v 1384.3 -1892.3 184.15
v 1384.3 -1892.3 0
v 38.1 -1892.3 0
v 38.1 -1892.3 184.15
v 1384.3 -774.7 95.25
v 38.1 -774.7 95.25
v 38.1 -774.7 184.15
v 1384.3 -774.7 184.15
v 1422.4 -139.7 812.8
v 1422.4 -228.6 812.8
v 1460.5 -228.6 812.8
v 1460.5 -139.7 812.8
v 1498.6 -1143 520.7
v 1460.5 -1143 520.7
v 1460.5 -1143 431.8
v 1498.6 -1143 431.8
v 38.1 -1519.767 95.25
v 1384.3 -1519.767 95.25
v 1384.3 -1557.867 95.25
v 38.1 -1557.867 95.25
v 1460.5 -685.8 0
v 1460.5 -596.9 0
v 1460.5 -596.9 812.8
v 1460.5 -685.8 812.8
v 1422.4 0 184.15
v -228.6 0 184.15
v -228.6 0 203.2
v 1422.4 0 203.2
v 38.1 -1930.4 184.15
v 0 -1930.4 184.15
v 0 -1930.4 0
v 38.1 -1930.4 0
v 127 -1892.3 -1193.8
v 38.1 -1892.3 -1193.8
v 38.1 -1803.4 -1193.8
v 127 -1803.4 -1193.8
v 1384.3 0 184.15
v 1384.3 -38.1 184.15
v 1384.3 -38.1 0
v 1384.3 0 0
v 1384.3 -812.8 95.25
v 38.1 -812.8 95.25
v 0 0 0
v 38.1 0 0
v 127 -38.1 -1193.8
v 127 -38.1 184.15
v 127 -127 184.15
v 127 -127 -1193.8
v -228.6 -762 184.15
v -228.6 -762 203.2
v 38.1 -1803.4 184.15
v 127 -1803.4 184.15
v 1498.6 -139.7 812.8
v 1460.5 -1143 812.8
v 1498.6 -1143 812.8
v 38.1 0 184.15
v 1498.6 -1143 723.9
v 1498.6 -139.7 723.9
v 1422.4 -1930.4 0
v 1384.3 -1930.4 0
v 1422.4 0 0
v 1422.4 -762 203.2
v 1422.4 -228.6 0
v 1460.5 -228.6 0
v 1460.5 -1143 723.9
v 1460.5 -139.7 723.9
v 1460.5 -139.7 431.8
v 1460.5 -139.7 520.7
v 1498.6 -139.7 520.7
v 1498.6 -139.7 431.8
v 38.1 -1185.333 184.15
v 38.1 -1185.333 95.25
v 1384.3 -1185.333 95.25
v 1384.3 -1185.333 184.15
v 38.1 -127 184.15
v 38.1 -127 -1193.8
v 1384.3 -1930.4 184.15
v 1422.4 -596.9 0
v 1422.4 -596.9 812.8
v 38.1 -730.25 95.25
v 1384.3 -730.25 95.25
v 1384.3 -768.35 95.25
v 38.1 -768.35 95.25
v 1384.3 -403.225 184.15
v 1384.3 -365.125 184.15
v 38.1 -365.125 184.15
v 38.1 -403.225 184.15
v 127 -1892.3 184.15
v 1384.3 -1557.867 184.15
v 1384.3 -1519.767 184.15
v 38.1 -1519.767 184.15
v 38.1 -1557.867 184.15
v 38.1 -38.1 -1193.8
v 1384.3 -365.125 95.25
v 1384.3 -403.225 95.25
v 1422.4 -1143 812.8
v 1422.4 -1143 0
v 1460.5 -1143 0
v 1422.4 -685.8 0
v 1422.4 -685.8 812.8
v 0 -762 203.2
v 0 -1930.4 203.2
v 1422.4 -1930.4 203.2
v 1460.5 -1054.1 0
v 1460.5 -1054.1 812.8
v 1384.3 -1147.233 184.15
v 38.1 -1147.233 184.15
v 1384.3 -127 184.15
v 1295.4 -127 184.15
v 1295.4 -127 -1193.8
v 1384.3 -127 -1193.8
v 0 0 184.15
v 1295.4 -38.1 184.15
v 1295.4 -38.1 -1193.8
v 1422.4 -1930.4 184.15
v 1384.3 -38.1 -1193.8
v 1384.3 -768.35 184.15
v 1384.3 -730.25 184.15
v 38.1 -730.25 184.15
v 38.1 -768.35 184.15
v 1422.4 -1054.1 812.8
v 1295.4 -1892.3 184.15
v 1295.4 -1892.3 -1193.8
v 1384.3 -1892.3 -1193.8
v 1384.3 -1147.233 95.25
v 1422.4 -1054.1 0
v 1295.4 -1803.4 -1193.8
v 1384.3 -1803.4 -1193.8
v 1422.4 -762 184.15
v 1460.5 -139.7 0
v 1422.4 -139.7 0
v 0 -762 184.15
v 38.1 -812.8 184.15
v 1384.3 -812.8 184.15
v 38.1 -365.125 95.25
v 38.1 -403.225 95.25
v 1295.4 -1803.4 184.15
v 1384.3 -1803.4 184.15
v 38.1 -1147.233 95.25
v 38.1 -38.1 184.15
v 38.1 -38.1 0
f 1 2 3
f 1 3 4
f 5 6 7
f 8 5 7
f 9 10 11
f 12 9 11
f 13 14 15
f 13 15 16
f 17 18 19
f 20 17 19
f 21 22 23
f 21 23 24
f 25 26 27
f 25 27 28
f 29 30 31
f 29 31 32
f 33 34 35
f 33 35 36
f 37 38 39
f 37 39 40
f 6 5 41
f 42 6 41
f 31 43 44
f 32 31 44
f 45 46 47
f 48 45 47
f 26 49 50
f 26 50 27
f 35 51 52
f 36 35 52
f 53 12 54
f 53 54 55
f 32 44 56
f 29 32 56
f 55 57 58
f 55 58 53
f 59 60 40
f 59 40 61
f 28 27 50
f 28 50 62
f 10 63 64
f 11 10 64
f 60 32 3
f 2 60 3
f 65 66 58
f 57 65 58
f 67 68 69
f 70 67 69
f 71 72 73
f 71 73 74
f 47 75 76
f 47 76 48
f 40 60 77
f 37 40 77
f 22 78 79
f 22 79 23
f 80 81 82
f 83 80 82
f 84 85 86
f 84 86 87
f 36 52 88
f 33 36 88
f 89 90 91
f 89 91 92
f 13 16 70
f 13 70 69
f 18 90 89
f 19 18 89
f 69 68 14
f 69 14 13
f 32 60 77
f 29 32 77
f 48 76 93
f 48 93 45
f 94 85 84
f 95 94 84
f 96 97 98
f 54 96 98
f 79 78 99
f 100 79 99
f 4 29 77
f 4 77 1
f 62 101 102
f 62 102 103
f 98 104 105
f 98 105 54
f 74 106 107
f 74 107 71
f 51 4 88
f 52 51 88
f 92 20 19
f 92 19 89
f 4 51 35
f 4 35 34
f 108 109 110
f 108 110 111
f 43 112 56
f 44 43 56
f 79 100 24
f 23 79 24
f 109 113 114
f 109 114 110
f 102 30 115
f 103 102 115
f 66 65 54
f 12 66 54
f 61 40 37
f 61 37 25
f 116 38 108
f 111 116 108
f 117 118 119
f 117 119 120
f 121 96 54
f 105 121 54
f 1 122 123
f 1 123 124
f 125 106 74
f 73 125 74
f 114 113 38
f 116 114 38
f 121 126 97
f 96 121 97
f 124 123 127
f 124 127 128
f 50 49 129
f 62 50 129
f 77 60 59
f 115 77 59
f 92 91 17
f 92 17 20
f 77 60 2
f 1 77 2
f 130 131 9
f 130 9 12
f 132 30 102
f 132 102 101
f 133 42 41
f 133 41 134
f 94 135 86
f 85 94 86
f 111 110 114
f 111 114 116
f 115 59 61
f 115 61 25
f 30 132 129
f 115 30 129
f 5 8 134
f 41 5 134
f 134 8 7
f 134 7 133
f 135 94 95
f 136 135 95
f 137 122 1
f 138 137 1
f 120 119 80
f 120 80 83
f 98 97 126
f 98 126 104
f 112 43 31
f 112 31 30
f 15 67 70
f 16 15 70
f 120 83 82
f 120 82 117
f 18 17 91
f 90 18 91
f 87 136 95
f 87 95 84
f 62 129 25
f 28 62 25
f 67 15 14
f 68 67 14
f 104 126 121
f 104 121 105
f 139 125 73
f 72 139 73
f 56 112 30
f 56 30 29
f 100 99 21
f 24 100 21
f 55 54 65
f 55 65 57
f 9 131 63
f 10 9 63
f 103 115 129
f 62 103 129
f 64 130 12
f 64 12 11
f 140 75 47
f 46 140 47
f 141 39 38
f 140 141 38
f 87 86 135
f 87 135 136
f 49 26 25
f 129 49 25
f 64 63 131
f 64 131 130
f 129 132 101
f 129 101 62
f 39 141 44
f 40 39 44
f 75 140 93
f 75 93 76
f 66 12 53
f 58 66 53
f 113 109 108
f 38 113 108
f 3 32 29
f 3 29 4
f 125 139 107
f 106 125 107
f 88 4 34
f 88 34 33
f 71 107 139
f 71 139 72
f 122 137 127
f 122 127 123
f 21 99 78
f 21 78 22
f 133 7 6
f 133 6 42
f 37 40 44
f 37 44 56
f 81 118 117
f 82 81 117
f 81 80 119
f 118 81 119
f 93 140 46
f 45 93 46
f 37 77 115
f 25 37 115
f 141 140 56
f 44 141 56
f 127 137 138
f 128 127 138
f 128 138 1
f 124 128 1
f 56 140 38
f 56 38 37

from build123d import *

# Parameters (mm, degrees)
F0_W      = 38.1
F0_H      = 184.15
F1_DEPTH  = 1930.4
F2_W      = 38.1
F2_H      = 184.15
F3_DEPTH  = 1346.2
F4_W      = 38.1
F4_H      = 184.15
F5_DEPTH  = 1930.4
F6_W      = 38.1
F6_H      = 184.15
F7_DEPTH  = 1346.2
F8_W      = 38.1
F8_H      = 88.9
F9_DEPTH  = 1346.2
F10_W     = 1651
F10_H     = 762
F11_DEPTH = 19.05
F12_W     = 1422.4
F12_H     = 1168.4
F13_DEPTH = 19.05
F14_W     = 88.9
F14_H     = 88.9
F15_DEPTH = 1377.95
F16_W     = 38.1
F16_H     = 88.9
F17_DEPTH = 812.8
F18_W     = 38.1
F18_H     = 88.9
F19_DEPTH = 1003.3


with BuildPart() as f1:
    # F0 (on Front) → F1 (new body)
    with BuildSketch(Plane.XZ):
        with Locations((19.05, 92.075)):
            Rectangle(F0_W, F0_H)
    extrude(amount=F1_DEPTH)


with BuildPart() as f3:
    # F2 (on face) → F3 (new body)
    with BuildSketch(Plane.YZ.offset(38.1)):
        with Locations((-1911.35, 92.075)):
            Rectangle(F2_W, F2_H)
    extrude(amount=F3_DEPTH)


with BuildPart() as f5:
    # F4 (on face) → F5 (new body, through all)
    with BuildSketch(Plane.XZ.offset(1930.4)):
        with Locations((1403.35, 92.075)):
            Rectangle(F4_W, F4_H)
    extrude(amount=-F5_DEPTH)


with BuildPart() as f7:
    # F6 (on face) → F7 (new body, through all)
    with BuildSketch(Plane.YZ.offset(38.1)):
        with Locations((-19.05, 92.075)):
            Rectangle(F6_W, F6_H)
    extrude(amount=F7_DEPTH)


with BuildPart() as f9:
    # F8 (on face) → F9 (new body, through all)
    with BuildSketch(Plane(origin=(1384.3, 0, 0), x_dir=(0, -1, 0), z_dir=(-1, 0, 0))):
        with Locations((749.3, 139.7)):
            Rectangle(F8_W, F8_H)
        with Locations((793.75, 139.7)):
            Rectangle(F8_W, F8_H)
        with Locations((384.175, 139.7)):
            Rectangle(F8_W, F8_H)
        with Locations((1166.283333, 139.7)):
            Rectangle(F8_W, F8_H)
        with Locations((1538.816667, 139.7)):
            Rectangle(F8_W, F8_H)
    extrude(amount=F9_DEPTH)


with BuildPart() as f11:
    # F10 (on face) → F11 (new body)
    with BuildSketch(Plane.XY.offset(184.15)):
        with Locations((596.9, -381)):
            Rectangle(F10_W, F10_H)
    extrude(amount=F11_DEPTH)


with BuildPart() as f13:
    # F12 (on face) → F13 (new body, through all)
    with BuildSketch(Plane.XY.offset(184.15)):
        with Locations((711.2, -1346.2)):
            Rectangle(F12_W, F12_H)
    extrude(amount=F13_DEPTH)


with BuildPart() as f15:
    # F14 (on face) → F15 (new body)
    with BuildSketch(Plane(origin=(0, 0, 184.15), x_dir=(1, 0, 0), z_dir=(0, 0, -1))):
        with Locations((1339.85, 1847.85)):
            Rectangle(F14_W, F14_H)
        with Locations((82.55, 1847.85)):
            Rectangle(F14_W, F14_H)
        with Locations((82.55, 82.55)):
            Rectangle(F14_W, F14_H)
        with Locations((1339.85, 82.55)):
            Rectangle(F14_W, F14_H)
    extrude(amount=F15_DEPTH)


with BuildPart() as f17:
    # F16 (on face) → F17 (new body)
    with BuildSketch(Plane(origin=(0, 0, 0), x_dir=(1, 0, 0), z_dir=(0, 0, -1))):
        with Locations((1441.45, 1098.55)):
            Rectangle(F16_W, F16_H)
        with Locations((1441.45, 184.15)):
            Rectangle(F16_W, F16_H)
        with Locations((1441.45, 641.35)):
            Rectangle(F16_W, F16_H)
    extrude(amount=-F17_DEPTH)


with BuildPart() as f19:
    # F18 (on face) → F19 (new body, through all)
    with BuildSketch(Plane.XZ.offset(1143)):
        with Locations((1479.55, 768.35)):
            Rectangle(F18_W, F18_H)
        with Locations((1479.55, 476.25)):
            Rectangle(F18_W, F18_H)
    extrude(amount=-F19_DEPTH)


solid = Compound([f1.part, f3.part, f5.part, f7.part, f9.part, f11.part, f13.part, f15.part, f17.part, f19.part])
